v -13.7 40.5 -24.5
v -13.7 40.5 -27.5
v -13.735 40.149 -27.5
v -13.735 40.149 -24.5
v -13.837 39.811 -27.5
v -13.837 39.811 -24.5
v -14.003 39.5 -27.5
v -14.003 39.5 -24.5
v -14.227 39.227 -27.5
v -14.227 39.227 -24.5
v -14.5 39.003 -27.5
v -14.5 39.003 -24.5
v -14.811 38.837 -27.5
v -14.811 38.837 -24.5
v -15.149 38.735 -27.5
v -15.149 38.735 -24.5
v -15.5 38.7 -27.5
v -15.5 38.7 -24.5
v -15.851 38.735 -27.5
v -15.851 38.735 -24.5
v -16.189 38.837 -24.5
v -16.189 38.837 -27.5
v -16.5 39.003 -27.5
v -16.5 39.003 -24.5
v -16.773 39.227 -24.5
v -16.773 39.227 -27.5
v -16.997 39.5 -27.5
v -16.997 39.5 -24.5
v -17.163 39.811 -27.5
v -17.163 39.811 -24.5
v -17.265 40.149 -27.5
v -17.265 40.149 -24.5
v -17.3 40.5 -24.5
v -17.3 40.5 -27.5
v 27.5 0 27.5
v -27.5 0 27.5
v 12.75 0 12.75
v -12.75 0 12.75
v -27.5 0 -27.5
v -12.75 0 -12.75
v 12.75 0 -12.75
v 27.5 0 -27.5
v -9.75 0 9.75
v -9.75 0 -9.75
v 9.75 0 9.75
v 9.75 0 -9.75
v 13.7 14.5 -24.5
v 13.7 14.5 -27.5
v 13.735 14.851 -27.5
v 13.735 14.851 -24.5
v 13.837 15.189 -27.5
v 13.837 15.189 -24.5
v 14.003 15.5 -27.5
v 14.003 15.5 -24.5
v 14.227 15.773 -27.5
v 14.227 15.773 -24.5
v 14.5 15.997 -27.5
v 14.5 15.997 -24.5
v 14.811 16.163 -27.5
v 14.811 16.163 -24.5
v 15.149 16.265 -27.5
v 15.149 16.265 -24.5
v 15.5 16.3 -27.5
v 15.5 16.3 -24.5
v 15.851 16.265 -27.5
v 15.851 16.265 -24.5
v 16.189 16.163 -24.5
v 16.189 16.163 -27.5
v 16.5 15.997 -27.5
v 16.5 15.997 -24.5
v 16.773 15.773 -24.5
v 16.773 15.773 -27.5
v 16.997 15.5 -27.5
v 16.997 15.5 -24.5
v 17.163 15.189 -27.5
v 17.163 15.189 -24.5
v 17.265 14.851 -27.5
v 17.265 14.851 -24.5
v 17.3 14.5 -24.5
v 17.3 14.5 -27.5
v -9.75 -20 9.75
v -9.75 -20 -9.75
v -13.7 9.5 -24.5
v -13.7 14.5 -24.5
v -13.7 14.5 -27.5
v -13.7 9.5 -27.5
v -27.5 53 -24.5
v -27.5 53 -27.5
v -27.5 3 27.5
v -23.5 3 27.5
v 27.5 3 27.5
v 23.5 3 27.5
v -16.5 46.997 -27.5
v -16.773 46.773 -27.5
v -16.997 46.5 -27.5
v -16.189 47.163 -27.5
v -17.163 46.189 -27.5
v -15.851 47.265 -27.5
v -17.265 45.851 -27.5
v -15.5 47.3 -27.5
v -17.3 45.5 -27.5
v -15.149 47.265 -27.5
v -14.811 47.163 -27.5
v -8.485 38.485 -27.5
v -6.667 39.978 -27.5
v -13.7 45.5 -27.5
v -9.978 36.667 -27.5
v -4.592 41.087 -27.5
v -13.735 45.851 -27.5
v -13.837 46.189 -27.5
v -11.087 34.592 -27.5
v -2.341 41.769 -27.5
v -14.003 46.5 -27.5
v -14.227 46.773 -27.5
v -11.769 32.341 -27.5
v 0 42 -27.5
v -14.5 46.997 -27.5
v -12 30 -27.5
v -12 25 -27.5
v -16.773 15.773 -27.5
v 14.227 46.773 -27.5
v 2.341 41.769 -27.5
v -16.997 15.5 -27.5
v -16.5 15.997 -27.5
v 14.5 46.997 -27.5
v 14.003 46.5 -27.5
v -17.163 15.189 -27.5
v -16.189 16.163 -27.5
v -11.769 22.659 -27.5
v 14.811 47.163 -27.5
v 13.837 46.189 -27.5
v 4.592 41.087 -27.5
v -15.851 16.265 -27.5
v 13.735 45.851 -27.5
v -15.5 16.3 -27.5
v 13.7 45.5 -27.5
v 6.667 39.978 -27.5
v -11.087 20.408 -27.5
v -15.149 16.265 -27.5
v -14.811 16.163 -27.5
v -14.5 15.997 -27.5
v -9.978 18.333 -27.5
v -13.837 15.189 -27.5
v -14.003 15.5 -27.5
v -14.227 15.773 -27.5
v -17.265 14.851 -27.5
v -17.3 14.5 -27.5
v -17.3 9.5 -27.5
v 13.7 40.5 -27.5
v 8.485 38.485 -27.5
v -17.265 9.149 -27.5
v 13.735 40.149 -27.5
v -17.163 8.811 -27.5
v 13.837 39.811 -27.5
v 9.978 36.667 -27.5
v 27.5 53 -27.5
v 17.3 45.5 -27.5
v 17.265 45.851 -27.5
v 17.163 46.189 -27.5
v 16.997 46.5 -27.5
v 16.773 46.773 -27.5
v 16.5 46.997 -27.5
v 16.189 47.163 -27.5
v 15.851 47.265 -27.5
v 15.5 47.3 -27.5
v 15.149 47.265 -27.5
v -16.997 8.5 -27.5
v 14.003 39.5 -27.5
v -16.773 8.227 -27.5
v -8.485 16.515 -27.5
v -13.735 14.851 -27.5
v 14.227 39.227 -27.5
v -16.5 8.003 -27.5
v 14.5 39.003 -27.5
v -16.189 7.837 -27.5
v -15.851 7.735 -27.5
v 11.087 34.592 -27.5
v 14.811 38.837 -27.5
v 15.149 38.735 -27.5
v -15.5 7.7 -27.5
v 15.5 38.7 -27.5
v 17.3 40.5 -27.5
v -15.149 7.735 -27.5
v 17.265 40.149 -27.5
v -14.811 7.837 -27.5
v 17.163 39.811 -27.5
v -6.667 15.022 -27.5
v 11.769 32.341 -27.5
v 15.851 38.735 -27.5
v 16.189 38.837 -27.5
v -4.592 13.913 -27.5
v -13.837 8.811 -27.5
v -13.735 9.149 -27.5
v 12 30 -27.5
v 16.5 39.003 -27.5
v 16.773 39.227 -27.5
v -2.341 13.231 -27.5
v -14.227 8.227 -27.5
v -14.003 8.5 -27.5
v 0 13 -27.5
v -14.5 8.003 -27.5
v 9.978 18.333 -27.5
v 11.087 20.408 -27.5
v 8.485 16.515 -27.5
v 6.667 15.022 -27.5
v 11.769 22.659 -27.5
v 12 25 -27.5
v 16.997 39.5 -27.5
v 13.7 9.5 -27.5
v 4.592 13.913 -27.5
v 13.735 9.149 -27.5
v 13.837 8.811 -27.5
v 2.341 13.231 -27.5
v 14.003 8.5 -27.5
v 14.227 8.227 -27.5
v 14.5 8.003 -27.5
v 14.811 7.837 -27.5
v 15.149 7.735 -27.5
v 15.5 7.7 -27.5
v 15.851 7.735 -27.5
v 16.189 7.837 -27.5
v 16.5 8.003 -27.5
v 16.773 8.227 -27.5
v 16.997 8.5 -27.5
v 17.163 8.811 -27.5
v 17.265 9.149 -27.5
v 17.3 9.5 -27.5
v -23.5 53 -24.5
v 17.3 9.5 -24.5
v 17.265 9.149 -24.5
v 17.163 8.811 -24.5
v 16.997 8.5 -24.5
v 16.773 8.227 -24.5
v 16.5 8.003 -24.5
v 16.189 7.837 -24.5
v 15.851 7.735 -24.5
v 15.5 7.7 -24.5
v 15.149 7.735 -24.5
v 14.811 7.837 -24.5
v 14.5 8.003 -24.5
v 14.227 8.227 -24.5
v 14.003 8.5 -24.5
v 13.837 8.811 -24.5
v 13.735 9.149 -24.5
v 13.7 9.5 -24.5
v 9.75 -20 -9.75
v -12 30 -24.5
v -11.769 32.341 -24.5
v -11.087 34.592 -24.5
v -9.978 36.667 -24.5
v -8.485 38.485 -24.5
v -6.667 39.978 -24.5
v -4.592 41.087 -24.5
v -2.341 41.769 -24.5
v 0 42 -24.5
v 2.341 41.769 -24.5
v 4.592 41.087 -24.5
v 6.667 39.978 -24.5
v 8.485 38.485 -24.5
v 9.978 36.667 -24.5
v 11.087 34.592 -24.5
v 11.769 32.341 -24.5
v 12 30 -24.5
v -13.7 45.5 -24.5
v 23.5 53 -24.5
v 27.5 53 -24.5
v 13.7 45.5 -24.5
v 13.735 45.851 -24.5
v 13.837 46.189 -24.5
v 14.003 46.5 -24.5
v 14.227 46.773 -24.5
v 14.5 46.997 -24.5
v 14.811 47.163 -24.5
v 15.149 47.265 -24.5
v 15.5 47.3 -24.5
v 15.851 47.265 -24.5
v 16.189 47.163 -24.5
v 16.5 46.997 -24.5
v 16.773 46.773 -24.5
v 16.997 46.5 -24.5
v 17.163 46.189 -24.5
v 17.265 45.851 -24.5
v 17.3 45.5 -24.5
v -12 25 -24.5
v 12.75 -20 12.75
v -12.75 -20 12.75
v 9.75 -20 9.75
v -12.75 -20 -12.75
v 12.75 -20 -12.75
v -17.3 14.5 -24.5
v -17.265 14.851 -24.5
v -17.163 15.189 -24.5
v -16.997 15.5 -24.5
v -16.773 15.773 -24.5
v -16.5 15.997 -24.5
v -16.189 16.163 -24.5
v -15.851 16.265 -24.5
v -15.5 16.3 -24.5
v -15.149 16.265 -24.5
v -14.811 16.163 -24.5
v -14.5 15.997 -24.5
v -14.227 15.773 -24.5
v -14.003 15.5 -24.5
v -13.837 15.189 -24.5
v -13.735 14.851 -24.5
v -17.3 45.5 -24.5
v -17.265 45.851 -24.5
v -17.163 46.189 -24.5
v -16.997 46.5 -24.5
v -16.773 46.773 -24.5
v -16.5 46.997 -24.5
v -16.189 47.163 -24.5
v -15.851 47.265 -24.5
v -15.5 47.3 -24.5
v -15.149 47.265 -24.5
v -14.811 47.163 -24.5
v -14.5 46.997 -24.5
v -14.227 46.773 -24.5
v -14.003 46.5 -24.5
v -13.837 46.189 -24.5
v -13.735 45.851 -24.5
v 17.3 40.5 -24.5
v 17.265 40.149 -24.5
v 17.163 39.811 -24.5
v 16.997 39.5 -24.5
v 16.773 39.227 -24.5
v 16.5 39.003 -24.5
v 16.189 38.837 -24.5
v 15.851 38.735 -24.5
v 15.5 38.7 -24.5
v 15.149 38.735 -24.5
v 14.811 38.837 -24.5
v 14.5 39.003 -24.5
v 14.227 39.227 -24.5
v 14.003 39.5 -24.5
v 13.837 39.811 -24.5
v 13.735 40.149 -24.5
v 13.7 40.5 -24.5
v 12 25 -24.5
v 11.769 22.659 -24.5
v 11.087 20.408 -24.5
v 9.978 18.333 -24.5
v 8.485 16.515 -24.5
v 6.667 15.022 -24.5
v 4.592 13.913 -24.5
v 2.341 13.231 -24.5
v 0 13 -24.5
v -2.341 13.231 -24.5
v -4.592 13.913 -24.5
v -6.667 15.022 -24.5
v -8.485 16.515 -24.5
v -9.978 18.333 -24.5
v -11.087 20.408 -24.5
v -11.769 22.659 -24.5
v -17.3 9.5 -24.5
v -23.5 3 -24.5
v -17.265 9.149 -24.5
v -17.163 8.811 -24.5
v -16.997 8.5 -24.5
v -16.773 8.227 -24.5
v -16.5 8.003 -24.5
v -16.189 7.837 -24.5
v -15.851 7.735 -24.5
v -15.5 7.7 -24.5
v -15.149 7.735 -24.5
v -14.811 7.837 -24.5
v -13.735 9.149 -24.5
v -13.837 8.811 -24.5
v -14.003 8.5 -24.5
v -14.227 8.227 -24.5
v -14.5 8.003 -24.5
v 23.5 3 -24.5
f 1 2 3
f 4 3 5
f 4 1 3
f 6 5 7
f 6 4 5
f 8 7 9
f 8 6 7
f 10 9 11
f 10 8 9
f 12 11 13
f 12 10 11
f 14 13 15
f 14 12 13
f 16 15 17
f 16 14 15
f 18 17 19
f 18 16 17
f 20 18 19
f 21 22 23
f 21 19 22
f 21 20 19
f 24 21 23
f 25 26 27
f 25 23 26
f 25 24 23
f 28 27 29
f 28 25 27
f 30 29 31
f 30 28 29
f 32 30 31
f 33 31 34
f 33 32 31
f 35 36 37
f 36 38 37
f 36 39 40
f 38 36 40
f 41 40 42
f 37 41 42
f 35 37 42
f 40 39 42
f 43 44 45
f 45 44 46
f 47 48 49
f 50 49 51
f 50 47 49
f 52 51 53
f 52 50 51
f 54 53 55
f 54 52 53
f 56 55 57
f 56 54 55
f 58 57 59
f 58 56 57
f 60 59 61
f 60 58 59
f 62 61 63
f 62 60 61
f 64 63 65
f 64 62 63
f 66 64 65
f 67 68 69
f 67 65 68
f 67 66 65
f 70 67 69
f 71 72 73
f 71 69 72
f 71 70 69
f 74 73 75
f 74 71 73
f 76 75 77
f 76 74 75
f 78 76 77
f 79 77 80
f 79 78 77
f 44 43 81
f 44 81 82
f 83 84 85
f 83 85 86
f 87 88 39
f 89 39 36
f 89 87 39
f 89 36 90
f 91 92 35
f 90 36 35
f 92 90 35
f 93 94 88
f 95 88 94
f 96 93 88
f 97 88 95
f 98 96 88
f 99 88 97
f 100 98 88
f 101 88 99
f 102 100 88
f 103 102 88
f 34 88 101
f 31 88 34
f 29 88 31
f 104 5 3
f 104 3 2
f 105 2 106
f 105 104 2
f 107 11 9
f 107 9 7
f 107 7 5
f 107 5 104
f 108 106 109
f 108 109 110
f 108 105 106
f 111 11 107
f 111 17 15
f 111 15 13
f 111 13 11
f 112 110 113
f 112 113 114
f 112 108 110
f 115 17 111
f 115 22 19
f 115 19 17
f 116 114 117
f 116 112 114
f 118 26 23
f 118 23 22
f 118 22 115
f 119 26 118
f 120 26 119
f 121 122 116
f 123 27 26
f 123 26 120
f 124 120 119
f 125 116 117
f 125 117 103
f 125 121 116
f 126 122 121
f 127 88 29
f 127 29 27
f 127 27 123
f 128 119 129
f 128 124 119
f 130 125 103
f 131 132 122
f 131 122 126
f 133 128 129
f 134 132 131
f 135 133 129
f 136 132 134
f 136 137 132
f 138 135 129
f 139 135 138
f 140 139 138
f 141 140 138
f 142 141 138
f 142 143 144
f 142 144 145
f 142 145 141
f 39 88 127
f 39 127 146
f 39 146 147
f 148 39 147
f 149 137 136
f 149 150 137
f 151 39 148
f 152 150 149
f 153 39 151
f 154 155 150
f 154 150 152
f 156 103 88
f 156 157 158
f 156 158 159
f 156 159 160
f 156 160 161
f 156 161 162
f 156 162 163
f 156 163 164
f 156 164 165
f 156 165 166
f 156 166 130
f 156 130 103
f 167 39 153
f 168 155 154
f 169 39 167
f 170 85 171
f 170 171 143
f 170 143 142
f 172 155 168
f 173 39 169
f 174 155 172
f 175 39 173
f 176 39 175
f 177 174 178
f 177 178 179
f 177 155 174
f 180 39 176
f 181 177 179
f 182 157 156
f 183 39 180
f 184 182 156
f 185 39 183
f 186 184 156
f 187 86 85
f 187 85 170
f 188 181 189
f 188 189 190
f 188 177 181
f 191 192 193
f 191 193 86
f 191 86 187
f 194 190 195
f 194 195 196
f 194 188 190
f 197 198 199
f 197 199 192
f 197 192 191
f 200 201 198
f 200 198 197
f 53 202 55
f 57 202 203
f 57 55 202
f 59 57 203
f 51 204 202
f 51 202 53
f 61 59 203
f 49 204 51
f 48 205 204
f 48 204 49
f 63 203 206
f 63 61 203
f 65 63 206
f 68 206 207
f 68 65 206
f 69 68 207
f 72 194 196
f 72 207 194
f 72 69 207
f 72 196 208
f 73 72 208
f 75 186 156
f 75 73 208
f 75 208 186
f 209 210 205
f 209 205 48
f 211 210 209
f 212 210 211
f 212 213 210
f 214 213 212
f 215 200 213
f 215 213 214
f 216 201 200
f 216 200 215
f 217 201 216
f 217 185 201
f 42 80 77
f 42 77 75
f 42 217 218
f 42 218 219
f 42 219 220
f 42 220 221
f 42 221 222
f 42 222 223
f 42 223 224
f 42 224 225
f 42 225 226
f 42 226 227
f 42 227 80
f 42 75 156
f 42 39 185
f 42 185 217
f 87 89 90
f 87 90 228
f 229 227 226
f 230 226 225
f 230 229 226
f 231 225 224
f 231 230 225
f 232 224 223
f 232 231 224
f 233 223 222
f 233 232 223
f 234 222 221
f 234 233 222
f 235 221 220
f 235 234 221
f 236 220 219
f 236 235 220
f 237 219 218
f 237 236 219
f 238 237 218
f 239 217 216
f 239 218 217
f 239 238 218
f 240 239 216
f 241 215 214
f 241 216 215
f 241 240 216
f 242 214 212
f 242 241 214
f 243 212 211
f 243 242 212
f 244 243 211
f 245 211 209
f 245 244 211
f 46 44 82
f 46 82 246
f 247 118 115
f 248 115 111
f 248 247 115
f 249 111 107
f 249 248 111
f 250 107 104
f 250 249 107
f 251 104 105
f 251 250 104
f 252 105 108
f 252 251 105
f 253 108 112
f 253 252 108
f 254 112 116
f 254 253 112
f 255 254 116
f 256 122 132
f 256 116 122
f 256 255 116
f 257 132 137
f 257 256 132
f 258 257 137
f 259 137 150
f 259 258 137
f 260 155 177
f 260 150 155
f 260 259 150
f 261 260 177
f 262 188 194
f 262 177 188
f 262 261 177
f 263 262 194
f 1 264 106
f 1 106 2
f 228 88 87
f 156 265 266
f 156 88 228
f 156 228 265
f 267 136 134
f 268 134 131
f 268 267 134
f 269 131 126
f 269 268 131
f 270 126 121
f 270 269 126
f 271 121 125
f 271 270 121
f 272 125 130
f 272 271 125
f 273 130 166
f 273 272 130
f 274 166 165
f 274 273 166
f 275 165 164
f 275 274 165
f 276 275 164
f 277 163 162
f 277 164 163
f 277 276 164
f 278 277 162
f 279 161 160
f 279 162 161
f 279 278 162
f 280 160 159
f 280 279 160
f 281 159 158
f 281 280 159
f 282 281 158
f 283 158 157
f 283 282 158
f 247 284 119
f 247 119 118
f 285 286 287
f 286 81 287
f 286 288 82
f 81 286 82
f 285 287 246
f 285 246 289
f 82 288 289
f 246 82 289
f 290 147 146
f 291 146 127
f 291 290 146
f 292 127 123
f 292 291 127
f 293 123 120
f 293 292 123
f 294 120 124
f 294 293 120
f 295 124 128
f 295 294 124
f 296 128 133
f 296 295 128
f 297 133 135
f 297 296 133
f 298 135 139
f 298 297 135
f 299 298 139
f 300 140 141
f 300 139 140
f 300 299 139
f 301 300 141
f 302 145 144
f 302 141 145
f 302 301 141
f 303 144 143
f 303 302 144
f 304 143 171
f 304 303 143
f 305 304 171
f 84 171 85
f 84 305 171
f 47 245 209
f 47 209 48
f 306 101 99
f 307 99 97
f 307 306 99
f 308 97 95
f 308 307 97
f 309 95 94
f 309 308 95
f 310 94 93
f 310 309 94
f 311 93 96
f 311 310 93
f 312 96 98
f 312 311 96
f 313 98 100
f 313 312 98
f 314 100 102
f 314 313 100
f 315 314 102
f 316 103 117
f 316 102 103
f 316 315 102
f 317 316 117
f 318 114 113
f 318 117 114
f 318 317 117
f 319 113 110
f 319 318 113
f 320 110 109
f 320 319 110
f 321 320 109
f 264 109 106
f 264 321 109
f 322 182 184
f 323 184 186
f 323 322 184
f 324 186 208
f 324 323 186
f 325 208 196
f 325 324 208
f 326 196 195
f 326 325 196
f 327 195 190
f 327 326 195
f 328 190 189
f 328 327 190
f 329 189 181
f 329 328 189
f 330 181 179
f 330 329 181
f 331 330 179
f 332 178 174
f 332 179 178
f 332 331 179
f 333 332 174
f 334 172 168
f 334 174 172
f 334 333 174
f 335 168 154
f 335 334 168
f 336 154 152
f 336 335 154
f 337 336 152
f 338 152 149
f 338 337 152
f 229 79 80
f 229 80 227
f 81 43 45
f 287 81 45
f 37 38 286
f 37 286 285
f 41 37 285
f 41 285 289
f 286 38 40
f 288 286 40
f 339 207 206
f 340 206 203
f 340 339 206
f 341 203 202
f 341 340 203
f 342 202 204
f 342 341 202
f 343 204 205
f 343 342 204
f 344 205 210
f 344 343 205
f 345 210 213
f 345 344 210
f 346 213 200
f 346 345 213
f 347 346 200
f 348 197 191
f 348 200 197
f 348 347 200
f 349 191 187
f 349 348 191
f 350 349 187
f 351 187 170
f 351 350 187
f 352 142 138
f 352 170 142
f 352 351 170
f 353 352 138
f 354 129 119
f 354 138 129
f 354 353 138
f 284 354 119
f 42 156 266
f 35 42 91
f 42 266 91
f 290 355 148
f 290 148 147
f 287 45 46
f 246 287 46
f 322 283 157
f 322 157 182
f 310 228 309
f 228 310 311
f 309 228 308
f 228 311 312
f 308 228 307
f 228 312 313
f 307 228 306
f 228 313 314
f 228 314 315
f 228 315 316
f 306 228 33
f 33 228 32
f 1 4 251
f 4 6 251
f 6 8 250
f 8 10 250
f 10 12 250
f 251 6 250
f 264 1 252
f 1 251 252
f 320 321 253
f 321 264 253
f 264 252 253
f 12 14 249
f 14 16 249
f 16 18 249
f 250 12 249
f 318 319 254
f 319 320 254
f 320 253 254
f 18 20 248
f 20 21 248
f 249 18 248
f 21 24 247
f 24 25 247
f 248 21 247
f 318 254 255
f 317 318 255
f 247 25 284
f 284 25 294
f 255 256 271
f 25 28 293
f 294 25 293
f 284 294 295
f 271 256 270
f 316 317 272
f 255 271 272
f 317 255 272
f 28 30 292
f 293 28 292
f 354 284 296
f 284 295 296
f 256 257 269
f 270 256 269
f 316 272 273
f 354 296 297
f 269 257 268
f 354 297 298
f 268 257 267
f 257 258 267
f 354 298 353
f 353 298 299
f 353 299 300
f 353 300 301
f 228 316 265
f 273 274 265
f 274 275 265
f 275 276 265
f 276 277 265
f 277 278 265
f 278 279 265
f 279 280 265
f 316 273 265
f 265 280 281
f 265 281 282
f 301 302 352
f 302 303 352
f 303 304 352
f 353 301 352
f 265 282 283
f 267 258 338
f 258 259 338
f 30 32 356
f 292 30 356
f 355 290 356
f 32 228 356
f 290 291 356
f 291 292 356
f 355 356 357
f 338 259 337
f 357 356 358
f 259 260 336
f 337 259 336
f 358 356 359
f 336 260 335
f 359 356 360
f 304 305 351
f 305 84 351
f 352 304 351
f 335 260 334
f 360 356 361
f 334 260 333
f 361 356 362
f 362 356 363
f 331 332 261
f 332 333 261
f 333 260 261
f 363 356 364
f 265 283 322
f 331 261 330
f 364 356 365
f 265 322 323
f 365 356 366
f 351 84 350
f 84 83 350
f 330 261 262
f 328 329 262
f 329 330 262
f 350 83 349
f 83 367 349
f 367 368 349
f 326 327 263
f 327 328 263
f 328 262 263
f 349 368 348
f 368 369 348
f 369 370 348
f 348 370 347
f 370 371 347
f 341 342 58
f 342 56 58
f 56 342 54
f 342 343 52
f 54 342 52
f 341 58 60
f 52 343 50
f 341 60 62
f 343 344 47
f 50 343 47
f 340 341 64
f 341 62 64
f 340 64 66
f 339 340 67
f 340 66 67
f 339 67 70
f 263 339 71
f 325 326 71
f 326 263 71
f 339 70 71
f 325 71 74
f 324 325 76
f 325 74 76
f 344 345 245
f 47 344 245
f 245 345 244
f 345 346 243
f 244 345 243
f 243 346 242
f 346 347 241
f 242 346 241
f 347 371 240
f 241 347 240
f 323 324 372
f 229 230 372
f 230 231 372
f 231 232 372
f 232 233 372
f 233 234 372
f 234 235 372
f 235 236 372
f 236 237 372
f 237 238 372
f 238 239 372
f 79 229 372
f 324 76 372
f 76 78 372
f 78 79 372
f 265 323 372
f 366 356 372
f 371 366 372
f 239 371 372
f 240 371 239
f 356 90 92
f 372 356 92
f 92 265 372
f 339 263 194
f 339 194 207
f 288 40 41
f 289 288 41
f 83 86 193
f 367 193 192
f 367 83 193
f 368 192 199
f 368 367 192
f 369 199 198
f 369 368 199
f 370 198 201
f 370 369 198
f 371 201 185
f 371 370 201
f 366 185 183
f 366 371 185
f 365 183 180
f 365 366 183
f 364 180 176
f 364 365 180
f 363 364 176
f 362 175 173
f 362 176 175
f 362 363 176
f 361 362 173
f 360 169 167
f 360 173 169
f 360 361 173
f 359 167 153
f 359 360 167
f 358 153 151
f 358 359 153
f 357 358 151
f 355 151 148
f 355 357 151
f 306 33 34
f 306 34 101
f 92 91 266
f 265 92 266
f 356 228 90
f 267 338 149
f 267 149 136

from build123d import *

# Parameters (mm, degrees)
SKETCH1_W           = 25.5
SKETCH1_H           = 25.5
SKETCH1_W_2         = 19.5
SKETCH1_H_2         = 19.5
BOSS_EXTRUDE1_DEPTH = 20
SKETCH2_W           = 55
SKETCH2_H           = 55
BOSS_EXTRUDE2_DEPTH = 3
SKETCH3_W           = 55
SKETCH3_H           = 3
BOSS_EXTRUDE3_DEPTH = 50
BOSS_EXTRUDE4_DEPTH = 4
CUT_EXTRUDE1_DEPTH  = 80.178595592


with BuildPart() as part:
    # Sketch1 → Boss-Extrude1 (new body)
    with BuildSketch(Plane(origin=(0, 0, 0), x_dir=(1, 0, 0), z_dir=(0, 1, 0))):
        Rectangle(SKETCH1_W, SKETCH1_H)
        Rectangle(SKETCH1_W_2, SKETCH1_H_2, mode=Mode.SUBTRACT)
    extrude(amount=-BOSS_EXTRUDE1_DEPTH)

    # Sketch2 → Boss-Extrude2 (add)
    with BuildSketch(Plane(origin=(0, 0, 0), x_dir=(1, 0, 0), z_dir=(0, 1, 0))):
        Rectangle(SKETCH2_W, SKETCH2_H)
    extrude(amount=BOSS_EXTRUDE2_DEPTH)

    # Sketch3 → Boss-Extrude3 (add)
    with BuildSketch(Plane(origin=(0, 3, 0), x_dir=(1, 0, 0), z_dir=(0, 1, 0))):
        with Locations((0, 26)):
            Rectangle(SKETCH3_W, SKETCH3_H)
    extrude(amount=BOSS_EXTRUDE3_DEPTH)

    # Sketch4 → Boss-Extrude4 (add)
    with BuildSketch(Plane.ZY.offset(27.5)):
        Polygon((-24.5, 3), (27.5, 3), (-24.5, 53), align=None)
    boss_extrude4 = extrude(amount=-BOSS_EXTRUDE4_DEPTH)

    # Mirror1: Boss-Extrude4 across plane
    add(boss_extrude4.mirror(Plane(origin=(0, 0, 0), x_dir=(0, 0, 1), z_dir=(1, 0, 0))))

    # Sketch5 → Cut-Extrude1 (cut, through all)
    with BuildSketch(Plane.XY.offset(-24.5)):
        with BuildLine():
            Line((-17.3, 9.5), (-17.3, 14.5))
            ThreePointArc((-17.3, 14.5), (-15.5, 16.3), (-13.7, 14.5))
            Line((-13.7, 14.5), (-13.7, 9.5))
            ThreePointArc((-13.7, 9.5), (-15.5, 7.7), (-17.3, 9.5))
        make_face()
        with BuildLine():
            Line((13.7, 9.5), (13.7, 14.5))
            ThreePointArc((13.7, 14.5), (15.5, 16.3), (17.3, 14.5))
            Line((17.3, 14.5), (17.3, 9.5))
            ThreePointArc((17.3, 9.5), (15.5, 7.7), (13.7, 9.5))
        make_face()
        with BuildLine():
            Line((13.7, 40.5), (13.7, 45.5))
            ThreePointArc((13.7, 45.5), (15.5, 47.3), (17.3, 45.5))
            Line((17.3, 45.5), (17.3, 40.5))
            ThreePointArc((17.3, 40.5), (15.5, 38.7), (13.7, 40.5))
        make_face()
        with BuildLine():
            Line((-17.3, 40.5), (-17.3, 45.5))
            ThreePointArc((-17.3, 45.5), (-15.5, 47.3), (-13.7, 45.5))
            Line((-13.7, 45.5), (-13.7, 40.5))
            ThreePointArc((-13.7, 40.5), (-15.5, 38.7), (-17.3, 40.5))
        make_face()
        with BuildLine():
            Line((-12, 25), (-12, 30))
            ThreePointArc((-12, 30), (0, 42), (12, 30))
            Line((12, 30), (12, 25))
            ThreePointArc((12, 25), (0, 13), (-12, 25))
        make_face()
    extrude(amount=-CUT_EXTRUDE1_DEPTH, mode=Mode.SUBTRACT)


solid = part.part
